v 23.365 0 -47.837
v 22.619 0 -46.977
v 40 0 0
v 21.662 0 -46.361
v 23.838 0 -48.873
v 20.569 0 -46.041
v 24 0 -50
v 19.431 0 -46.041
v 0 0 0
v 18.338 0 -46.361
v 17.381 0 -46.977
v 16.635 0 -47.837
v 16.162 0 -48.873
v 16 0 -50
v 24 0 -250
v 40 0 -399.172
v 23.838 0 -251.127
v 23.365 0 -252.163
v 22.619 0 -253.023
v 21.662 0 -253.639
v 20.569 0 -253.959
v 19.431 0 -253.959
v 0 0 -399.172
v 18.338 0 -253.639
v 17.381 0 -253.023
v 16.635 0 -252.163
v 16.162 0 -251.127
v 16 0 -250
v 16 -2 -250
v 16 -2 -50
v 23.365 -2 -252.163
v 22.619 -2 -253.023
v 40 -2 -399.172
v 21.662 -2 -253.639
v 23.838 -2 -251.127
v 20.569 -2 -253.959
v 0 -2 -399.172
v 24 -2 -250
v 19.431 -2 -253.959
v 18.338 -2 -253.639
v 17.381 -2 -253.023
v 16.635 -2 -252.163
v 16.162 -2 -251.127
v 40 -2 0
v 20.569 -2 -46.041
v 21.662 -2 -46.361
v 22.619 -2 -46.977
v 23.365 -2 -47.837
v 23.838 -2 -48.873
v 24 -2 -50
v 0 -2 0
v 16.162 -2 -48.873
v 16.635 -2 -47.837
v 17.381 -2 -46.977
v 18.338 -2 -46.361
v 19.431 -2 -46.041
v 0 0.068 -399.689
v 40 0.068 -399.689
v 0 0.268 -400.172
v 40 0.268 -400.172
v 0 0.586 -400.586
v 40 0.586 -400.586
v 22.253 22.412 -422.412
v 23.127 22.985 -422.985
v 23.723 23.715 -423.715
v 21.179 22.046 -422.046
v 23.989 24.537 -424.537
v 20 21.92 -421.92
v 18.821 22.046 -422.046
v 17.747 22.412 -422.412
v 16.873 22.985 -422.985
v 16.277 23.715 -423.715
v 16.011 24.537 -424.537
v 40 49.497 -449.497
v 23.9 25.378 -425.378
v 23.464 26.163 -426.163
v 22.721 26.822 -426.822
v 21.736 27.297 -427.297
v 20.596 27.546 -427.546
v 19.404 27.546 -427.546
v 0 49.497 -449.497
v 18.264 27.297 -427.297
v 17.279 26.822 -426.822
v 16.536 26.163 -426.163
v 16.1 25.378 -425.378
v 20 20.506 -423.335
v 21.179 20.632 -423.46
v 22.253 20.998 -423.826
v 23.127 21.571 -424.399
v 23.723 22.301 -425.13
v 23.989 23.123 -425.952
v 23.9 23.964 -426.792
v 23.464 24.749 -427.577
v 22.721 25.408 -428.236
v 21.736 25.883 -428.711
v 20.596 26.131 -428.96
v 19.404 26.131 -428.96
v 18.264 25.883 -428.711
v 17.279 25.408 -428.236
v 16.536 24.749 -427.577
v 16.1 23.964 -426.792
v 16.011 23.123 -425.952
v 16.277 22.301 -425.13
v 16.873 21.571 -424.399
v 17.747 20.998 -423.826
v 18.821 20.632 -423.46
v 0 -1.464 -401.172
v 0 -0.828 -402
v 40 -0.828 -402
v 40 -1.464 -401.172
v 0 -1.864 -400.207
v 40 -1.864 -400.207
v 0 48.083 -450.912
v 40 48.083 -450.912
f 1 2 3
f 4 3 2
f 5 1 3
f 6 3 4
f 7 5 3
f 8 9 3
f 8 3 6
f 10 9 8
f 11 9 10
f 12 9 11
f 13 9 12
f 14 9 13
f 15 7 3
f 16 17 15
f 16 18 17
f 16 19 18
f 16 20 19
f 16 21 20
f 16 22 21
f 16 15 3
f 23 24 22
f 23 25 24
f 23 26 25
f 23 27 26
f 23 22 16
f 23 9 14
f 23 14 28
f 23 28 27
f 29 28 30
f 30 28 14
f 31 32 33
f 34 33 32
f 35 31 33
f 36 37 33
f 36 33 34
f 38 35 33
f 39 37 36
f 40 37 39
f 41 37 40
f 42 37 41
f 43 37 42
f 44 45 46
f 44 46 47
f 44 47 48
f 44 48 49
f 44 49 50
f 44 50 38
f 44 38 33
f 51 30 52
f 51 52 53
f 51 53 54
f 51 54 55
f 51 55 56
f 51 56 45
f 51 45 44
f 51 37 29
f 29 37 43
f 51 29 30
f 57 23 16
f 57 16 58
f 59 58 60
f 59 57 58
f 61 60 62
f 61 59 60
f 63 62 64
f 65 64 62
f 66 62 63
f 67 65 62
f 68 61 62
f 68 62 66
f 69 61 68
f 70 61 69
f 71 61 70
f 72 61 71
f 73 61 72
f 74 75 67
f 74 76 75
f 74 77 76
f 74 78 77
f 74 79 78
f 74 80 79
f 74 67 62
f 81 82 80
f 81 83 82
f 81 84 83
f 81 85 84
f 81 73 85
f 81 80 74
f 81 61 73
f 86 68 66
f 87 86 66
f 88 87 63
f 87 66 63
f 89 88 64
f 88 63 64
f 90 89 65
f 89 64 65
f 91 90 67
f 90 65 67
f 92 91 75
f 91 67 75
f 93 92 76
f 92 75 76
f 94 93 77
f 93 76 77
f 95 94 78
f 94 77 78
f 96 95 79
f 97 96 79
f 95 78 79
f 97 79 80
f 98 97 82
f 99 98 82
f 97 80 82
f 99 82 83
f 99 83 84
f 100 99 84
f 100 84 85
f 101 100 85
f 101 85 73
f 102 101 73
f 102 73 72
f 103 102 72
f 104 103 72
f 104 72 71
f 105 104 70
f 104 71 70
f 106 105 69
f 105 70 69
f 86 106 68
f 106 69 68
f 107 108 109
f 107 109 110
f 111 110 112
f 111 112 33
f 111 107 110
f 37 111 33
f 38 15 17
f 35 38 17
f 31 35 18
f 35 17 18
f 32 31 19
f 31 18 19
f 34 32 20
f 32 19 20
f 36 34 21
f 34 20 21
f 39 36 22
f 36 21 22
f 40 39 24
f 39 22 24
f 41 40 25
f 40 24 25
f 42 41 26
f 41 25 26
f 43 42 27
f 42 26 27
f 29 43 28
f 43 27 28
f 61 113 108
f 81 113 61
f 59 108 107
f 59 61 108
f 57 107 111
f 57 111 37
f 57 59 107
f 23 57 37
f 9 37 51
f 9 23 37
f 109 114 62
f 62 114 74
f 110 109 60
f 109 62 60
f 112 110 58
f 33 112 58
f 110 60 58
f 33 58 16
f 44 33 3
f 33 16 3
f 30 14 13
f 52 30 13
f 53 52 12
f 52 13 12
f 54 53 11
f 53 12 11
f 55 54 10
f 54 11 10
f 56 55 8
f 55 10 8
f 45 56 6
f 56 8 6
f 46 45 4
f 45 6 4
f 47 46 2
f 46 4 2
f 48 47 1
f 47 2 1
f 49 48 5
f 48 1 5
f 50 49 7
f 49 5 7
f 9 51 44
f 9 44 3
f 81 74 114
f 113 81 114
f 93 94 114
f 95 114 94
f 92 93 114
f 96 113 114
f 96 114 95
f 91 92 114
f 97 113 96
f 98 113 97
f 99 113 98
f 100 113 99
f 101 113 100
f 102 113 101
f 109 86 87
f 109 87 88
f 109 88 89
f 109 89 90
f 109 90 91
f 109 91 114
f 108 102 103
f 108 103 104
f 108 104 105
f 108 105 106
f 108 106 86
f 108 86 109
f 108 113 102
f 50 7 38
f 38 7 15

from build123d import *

# Parameters (mm, degrees)
BASE_FLANGE1_DEPTH = 40
SKETCH7_R          = 4
CUT_EXTRUDE1_DEPTH = 2
CUT_EXTRUDE2_DEPTH = 2


# Sheet-metal steps are written as plain solids
with BuildPart() as part:
    # Sketch1 → Base-Flange1 (new body)
    with BuildSketch(Plane(origin=(0, 0, 0), x_dir=(0, 0, -1), z_dir=(1, 0, 0))):
        with BuildLine():
            Line((0, 0), (399.171572875, 0))
            ThreePointArc((399.171572875, 0), (399.93693974, 0.152240935), (400.585786438, 0.585786438))
            Line((400.585786438, 0.585786438), (449.497474683, 49.497474683))
            Line((449.497474683, 49.497474683), (450.911688245, 48.083261121))
            Line((450.911688245, 48.083261121), (402, -0.828427125))
            ThreePointArc((402, -0.828427125), (400.702306605, -1.69551813), (399.171572875, -2))
            Line((399.171572875, -2), (0, -2))
            Line((0, -2), (0, 0))
        make_face()
    extrude(amount=BASE_FLANGE1_DEPTH)

    # Sketch7 → Cut-Extrude1 (cut)
    with BuildSketch(Plane(origin=(0, -200, -200), x_dir=(1, 0, 0), z_dir=(0, 0.7071067811865456, 0.7071067811865496))):
        with Locations(Location((20, 317.842712475, 0), (0, 0, 270))):
            Circle(SKETCH7_R)
    extrude(amount=-CUT_EXTRUDE1_DEPTH, mode=Mode.SUBTRACT)

    # Sketch8 → Cut-Extrude2 (cut)
    with BuildSketch(Plane(origin=(0, 0, 0), x_dir=(1, 0, 0), z_dir=(0, 1, 0))):
        with BuildLine():
            Line((24, 50), (24, 250))
            ThreePointArc((24, 250), (20, 254), (16, 250))
            Line((16, 250), (16, 50))
            ThreePointArc((16, 50), (20, 46), (24, 50))
        make_face()
    extrude(amount=-CUT_EXTRUDE2_DEPTH, mode=Mode.SUBTRACT)


solid = part.part
